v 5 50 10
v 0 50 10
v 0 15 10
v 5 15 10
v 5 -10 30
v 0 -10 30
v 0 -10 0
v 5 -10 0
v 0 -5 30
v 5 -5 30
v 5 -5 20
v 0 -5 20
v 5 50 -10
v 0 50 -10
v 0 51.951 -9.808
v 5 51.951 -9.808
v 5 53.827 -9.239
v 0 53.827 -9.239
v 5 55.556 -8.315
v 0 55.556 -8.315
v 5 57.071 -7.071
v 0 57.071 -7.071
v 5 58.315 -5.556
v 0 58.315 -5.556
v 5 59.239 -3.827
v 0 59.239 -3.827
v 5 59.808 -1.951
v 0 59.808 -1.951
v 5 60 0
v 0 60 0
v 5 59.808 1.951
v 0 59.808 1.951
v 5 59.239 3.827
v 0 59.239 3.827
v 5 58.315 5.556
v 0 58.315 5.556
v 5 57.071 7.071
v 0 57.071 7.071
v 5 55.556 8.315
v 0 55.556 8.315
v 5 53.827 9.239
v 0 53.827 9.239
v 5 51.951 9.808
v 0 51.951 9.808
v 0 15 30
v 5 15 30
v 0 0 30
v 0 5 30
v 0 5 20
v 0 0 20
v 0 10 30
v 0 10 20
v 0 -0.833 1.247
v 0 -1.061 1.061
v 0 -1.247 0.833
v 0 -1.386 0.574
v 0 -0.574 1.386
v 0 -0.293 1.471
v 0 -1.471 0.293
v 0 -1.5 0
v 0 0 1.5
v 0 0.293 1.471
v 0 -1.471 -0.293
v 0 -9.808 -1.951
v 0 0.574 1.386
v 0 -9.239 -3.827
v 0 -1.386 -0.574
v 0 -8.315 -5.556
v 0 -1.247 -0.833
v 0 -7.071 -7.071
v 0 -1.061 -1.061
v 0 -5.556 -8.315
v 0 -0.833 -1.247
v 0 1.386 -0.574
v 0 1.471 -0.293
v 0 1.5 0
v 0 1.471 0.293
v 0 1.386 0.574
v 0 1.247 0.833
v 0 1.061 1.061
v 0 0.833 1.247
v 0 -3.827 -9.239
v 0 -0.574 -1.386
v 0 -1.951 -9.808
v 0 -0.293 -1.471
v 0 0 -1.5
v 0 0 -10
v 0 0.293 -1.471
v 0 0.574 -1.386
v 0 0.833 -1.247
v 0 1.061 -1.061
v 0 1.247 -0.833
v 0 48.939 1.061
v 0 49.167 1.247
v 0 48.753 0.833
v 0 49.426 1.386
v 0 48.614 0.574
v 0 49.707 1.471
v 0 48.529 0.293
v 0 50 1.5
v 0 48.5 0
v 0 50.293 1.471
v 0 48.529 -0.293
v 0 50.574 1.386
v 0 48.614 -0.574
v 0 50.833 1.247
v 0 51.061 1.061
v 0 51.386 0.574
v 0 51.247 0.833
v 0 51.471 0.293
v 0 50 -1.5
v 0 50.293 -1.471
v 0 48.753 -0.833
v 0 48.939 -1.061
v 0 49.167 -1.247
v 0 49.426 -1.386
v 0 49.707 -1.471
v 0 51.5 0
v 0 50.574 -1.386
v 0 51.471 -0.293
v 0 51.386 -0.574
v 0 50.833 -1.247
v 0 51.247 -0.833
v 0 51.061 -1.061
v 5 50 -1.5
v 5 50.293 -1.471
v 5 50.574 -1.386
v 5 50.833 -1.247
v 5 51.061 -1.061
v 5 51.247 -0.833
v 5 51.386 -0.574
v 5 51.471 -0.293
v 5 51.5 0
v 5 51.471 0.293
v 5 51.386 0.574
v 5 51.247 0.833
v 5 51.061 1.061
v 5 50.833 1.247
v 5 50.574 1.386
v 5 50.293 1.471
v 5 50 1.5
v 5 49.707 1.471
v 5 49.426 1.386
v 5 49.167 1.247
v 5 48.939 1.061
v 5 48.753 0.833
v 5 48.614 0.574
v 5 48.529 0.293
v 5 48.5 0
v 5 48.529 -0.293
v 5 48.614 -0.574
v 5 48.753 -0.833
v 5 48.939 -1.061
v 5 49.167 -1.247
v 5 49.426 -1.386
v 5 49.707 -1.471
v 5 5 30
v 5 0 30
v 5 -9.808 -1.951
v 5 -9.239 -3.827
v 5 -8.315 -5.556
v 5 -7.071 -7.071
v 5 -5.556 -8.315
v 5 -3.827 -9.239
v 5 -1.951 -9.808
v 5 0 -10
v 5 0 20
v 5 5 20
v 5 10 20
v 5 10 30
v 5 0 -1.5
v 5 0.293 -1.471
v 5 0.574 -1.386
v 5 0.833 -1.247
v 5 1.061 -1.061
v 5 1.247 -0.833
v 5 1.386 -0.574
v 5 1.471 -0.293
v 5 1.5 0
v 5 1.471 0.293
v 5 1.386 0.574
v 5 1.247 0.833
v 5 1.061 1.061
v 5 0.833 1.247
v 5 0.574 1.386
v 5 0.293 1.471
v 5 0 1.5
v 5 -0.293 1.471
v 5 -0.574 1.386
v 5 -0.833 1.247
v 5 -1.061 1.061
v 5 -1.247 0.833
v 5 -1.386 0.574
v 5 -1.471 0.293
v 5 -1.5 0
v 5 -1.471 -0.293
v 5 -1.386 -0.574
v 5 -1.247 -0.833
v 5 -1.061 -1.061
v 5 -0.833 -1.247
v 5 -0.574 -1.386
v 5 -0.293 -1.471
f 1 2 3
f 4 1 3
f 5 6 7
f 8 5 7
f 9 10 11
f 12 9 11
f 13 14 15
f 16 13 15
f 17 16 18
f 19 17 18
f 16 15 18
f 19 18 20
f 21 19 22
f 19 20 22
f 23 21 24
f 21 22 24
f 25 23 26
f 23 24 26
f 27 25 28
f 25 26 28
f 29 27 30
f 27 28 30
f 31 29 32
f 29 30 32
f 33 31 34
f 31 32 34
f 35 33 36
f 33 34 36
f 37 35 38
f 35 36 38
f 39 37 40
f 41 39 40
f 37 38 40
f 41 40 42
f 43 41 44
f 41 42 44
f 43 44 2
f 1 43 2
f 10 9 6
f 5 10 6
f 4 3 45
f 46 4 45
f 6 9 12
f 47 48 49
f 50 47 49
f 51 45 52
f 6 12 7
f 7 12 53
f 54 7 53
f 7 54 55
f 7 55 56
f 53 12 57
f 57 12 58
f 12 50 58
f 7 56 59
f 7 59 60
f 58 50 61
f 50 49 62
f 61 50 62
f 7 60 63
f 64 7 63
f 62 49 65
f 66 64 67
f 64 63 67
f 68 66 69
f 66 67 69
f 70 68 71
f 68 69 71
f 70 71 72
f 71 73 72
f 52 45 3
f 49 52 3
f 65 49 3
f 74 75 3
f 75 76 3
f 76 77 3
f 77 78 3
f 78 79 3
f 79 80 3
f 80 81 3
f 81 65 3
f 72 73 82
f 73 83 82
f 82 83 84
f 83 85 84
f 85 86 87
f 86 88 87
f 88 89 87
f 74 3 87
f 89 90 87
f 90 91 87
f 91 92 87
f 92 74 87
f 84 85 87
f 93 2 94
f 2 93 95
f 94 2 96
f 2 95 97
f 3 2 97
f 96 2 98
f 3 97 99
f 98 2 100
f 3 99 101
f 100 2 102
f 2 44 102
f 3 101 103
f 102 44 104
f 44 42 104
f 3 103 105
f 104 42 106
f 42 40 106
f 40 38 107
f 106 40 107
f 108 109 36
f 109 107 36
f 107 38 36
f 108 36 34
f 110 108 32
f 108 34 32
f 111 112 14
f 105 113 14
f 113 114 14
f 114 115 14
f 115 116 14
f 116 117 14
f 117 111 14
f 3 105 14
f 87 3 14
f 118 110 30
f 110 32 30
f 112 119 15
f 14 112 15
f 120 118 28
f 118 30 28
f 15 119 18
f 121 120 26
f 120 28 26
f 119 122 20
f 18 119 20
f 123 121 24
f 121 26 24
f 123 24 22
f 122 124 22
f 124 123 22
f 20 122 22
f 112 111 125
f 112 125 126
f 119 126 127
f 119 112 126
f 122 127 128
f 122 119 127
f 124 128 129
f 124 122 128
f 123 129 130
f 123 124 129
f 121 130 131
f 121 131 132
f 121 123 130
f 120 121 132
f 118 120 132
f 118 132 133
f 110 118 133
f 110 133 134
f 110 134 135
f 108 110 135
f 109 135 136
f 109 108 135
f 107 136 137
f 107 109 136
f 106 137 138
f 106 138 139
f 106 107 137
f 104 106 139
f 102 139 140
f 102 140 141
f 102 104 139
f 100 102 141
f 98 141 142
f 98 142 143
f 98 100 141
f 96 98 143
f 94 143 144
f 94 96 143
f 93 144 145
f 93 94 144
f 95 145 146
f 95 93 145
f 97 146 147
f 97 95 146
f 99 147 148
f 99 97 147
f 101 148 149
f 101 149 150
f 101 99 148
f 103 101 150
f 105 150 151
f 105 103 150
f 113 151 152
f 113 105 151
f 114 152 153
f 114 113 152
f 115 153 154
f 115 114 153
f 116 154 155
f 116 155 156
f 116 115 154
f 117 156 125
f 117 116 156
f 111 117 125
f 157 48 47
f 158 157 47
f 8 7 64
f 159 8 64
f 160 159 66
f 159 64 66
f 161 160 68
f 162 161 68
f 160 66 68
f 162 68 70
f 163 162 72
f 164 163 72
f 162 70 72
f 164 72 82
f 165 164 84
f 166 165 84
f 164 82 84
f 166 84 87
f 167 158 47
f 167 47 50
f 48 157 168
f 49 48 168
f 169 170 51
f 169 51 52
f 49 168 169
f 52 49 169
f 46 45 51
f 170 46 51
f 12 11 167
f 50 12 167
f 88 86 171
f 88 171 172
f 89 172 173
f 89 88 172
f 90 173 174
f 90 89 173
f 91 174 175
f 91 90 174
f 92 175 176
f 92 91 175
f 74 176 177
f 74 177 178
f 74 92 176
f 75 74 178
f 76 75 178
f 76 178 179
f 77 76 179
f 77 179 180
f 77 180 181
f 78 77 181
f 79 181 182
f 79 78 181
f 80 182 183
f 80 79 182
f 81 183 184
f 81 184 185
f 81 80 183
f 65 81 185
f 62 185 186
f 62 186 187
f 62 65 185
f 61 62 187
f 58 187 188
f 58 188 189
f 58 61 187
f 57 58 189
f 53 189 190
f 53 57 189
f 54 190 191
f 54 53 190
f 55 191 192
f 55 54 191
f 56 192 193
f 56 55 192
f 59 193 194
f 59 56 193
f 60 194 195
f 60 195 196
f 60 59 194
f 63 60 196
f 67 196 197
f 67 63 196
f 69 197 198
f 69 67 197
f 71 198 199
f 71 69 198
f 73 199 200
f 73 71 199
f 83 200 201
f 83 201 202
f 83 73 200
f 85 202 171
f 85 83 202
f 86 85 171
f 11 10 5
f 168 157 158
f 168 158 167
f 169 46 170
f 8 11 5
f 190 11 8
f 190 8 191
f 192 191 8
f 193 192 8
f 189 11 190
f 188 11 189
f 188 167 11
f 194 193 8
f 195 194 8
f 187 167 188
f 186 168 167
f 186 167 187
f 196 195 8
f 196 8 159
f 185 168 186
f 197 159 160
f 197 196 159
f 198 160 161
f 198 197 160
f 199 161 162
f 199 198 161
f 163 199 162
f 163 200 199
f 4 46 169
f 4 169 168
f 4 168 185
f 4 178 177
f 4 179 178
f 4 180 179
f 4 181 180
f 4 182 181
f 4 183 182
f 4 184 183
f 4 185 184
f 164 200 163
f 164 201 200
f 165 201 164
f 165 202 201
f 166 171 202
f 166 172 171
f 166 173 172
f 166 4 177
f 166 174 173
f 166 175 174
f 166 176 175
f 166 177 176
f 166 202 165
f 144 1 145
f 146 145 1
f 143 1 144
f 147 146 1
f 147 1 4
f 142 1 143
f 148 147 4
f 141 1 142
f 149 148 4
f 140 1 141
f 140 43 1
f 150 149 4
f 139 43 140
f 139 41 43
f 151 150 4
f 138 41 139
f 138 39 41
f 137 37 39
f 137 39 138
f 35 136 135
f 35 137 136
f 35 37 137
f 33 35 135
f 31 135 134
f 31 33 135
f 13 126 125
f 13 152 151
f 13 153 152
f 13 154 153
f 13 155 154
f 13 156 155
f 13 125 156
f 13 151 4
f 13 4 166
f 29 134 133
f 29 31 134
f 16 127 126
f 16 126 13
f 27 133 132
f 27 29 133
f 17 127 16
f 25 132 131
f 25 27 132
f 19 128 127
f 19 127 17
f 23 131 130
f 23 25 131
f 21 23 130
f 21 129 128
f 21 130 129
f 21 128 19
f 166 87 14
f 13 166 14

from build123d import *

# Parameters (mm, degrees)
SKETCH1_R           = 1.5
BOSS_EXTRUDE1_DEPTH = 5
SKETCH2_W           = 10
SKETCH2_H           = 5
CUT_EXTRUDE1_DEPTH  = 5


with BuildPart() as part:
    # Sketch1 → Boss-Extrude1 (new body)
    with BuildSketch(Plane(origin=(0, 0, 0), x_dir=(0, 0, -1), z_dir=(1, 0, 0))):
        with BuildLine():
            Line((-10, 15), (-30, 15))
            Line((-30, 15), (-30, -10))
            Line((-30, -10), (0, -10))
            ThreePointArc((0, -10), (7.071067812, -7.071067812), (10, 0))
            Line((10, 0), (10, 50))
            ThreePointArc((10, 50), (0, 60), (-10, 50))
            Line((-10, 50), (-10, 15))
        make_face()
        with Locations((0, 50)):
            Circle(SKETCH1_R, mode=Mode.SUBTRACT)
        Circle(SKETCH1_R, mode=Mode.SUBTRACT)
    extrude(amount=BOSS_EXTRUDE1_DEPTH)

    # Sketch2 → Cut-Extrude1 (cut)
    with BuildSketch(Plane(origin=(5, 0, 0), x_dir=(0, 0, -1), z_dir=(1, 0, 0))):
        with Locations((-25, 7.5)):
            Rectangle(SKETCH2_W, SKETCH2_H)
        with Locations((-25, -2.5)):
            Rectangle(SKETCH2_W, SKETCH2_H)
    extrude(amount=-CUT_EXTRUDE1_DEPTH, mode=Mode.SUBTRACT)


solid = part.part
